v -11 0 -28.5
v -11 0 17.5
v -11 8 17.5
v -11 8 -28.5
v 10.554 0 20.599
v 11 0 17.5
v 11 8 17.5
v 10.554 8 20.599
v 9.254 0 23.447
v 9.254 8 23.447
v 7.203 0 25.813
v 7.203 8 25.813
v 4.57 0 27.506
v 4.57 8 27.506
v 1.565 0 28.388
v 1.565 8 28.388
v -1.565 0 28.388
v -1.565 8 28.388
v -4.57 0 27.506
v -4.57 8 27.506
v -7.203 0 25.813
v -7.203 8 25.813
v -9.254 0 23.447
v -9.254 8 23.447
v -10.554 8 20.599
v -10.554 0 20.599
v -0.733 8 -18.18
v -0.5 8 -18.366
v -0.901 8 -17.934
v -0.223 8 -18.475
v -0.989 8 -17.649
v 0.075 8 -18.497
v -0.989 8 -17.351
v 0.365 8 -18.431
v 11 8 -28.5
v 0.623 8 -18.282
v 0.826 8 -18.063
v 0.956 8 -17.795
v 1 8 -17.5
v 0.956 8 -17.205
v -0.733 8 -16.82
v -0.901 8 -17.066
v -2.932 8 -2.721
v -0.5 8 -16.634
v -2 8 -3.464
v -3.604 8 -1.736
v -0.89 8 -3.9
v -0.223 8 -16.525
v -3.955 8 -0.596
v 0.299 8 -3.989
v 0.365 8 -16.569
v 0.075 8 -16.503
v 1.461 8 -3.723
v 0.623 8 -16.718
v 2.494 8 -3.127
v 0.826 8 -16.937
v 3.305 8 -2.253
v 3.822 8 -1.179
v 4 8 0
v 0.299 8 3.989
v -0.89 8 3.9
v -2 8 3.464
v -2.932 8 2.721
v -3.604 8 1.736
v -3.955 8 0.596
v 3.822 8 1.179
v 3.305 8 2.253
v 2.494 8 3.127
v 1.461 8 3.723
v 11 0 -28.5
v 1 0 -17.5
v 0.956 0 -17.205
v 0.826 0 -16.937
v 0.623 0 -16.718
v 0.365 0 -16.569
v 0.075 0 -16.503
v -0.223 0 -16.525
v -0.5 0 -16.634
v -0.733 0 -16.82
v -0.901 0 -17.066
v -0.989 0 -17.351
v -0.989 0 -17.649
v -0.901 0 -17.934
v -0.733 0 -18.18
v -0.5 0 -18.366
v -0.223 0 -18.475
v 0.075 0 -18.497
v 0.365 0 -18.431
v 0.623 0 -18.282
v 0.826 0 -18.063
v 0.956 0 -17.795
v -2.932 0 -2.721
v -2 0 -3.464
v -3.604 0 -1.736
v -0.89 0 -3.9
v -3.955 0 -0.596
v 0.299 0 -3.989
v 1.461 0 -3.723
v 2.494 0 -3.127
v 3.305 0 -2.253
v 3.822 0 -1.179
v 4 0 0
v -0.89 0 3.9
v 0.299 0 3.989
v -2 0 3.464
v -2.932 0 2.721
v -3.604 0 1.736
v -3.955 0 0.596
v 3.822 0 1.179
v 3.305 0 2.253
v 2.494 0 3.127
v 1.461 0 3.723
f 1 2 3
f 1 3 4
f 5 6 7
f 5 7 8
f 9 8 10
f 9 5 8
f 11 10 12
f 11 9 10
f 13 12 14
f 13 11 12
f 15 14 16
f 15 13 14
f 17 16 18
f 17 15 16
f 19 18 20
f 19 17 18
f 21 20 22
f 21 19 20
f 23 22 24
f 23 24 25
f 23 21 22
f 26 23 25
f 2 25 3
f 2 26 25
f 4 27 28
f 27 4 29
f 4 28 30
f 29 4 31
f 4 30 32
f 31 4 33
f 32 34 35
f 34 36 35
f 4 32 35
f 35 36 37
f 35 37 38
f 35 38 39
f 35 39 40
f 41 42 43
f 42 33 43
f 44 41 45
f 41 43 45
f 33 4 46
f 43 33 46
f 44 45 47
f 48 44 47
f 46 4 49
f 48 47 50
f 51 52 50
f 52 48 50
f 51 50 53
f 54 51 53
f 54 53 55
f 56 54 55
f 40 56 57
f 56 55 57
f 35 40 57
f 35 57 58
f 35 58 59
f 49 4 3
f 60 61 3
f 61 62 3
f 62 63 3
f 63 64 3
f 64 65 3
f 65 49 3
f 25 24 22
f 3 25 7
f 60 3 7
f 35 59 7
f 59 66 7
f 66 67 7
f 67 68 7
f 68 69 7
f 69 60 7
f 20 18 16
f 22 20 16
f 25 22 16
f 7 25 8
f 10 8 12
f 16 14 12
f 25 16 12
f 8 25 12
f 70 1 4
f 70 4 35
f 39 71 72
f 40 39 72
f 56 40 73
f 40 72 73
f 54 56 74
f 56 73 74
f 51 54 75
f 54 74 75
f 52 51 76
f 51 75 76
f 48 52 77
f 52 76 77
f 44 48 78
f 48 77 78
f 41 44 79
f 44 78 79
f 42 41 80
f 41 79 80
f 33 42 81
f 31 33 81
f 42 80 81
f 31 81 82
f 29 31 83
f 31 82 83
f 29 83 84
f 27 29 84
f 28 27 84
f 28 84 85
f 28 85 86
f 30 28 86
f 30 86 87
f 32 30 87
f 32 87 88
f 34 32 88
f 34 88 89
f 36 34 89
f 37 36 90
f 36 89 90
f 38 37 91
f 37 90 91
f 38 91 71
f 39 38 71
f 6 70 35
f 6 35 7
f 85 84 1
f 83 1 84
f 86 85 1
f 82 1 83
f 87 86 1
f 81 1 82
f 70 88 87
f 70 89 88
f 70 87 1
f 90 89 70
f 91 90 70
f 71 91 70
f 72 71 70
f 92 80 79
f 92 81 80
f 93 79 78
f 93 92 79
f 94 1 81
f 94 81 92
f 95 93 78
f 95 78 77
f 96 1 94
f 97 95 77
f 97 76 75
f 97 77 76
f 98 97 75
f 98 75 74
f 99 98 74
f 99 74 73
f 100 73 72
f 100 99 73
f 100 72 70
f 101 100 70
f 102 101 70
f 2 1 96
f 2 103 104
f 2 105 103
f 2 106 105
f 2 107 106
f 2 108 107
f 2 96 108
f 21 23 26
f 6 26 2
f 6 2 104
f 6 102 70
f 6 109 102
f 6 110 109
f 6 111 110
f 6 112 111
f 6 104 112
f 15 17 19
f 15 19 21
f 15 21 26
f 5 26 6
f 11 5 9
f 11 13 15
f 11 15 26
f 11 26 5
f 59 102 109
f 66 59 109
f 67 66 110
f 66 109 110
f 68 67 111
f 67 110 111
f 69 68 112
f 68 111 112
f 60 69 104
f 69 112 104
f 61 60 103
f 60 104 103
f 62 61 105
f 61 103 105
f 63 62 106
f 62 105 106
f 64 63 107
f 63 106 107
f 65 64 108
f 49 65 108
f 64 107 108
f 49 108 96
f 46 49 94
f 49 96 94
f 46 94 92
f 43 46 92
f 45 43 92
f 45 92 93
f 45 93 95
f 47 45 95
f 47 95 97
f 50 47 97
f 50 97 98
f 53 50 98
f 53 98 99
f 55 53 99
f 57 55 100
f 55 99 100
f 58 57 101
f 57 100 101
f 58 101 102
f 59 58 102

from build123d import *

# Parameters (mm, degrees)
F0_R     = 1
F0_R_2   = 4
F1_DEPTH = 8


# Not quite as in the source:
# - a feature names something its author has since deleted; it is built from what else it names


with BuildPart() as f1:
    # F0 (on Front) → F1 (new body)
    with BuildSketch(Plane.XZ):
        with BuildLine():
            Line((11, -17.5), (11, 17.5))
            ThreePointArc((11, 17.5), (0, 28.5), (-11, 17.5))
            Line((-11, 17.5), (-11, -17.5))
            Line((-11, -17.5), (-11, -28.5))
            Line((-11, -28.5), (0, -28.5))
            Line((0, -28.5), (11, -28.5))
            Line((11, -28.5), (11, -17.5))
        make_face()
        with Locations((0, -17.5)):
            Circle(F0_R, mode=Mode.SUBTRACT)
        Circle(F0_R_2, mode=Mode.SUBTRACT)
    extrude(amount=-F1_DEPTH)


solid = f1.part
